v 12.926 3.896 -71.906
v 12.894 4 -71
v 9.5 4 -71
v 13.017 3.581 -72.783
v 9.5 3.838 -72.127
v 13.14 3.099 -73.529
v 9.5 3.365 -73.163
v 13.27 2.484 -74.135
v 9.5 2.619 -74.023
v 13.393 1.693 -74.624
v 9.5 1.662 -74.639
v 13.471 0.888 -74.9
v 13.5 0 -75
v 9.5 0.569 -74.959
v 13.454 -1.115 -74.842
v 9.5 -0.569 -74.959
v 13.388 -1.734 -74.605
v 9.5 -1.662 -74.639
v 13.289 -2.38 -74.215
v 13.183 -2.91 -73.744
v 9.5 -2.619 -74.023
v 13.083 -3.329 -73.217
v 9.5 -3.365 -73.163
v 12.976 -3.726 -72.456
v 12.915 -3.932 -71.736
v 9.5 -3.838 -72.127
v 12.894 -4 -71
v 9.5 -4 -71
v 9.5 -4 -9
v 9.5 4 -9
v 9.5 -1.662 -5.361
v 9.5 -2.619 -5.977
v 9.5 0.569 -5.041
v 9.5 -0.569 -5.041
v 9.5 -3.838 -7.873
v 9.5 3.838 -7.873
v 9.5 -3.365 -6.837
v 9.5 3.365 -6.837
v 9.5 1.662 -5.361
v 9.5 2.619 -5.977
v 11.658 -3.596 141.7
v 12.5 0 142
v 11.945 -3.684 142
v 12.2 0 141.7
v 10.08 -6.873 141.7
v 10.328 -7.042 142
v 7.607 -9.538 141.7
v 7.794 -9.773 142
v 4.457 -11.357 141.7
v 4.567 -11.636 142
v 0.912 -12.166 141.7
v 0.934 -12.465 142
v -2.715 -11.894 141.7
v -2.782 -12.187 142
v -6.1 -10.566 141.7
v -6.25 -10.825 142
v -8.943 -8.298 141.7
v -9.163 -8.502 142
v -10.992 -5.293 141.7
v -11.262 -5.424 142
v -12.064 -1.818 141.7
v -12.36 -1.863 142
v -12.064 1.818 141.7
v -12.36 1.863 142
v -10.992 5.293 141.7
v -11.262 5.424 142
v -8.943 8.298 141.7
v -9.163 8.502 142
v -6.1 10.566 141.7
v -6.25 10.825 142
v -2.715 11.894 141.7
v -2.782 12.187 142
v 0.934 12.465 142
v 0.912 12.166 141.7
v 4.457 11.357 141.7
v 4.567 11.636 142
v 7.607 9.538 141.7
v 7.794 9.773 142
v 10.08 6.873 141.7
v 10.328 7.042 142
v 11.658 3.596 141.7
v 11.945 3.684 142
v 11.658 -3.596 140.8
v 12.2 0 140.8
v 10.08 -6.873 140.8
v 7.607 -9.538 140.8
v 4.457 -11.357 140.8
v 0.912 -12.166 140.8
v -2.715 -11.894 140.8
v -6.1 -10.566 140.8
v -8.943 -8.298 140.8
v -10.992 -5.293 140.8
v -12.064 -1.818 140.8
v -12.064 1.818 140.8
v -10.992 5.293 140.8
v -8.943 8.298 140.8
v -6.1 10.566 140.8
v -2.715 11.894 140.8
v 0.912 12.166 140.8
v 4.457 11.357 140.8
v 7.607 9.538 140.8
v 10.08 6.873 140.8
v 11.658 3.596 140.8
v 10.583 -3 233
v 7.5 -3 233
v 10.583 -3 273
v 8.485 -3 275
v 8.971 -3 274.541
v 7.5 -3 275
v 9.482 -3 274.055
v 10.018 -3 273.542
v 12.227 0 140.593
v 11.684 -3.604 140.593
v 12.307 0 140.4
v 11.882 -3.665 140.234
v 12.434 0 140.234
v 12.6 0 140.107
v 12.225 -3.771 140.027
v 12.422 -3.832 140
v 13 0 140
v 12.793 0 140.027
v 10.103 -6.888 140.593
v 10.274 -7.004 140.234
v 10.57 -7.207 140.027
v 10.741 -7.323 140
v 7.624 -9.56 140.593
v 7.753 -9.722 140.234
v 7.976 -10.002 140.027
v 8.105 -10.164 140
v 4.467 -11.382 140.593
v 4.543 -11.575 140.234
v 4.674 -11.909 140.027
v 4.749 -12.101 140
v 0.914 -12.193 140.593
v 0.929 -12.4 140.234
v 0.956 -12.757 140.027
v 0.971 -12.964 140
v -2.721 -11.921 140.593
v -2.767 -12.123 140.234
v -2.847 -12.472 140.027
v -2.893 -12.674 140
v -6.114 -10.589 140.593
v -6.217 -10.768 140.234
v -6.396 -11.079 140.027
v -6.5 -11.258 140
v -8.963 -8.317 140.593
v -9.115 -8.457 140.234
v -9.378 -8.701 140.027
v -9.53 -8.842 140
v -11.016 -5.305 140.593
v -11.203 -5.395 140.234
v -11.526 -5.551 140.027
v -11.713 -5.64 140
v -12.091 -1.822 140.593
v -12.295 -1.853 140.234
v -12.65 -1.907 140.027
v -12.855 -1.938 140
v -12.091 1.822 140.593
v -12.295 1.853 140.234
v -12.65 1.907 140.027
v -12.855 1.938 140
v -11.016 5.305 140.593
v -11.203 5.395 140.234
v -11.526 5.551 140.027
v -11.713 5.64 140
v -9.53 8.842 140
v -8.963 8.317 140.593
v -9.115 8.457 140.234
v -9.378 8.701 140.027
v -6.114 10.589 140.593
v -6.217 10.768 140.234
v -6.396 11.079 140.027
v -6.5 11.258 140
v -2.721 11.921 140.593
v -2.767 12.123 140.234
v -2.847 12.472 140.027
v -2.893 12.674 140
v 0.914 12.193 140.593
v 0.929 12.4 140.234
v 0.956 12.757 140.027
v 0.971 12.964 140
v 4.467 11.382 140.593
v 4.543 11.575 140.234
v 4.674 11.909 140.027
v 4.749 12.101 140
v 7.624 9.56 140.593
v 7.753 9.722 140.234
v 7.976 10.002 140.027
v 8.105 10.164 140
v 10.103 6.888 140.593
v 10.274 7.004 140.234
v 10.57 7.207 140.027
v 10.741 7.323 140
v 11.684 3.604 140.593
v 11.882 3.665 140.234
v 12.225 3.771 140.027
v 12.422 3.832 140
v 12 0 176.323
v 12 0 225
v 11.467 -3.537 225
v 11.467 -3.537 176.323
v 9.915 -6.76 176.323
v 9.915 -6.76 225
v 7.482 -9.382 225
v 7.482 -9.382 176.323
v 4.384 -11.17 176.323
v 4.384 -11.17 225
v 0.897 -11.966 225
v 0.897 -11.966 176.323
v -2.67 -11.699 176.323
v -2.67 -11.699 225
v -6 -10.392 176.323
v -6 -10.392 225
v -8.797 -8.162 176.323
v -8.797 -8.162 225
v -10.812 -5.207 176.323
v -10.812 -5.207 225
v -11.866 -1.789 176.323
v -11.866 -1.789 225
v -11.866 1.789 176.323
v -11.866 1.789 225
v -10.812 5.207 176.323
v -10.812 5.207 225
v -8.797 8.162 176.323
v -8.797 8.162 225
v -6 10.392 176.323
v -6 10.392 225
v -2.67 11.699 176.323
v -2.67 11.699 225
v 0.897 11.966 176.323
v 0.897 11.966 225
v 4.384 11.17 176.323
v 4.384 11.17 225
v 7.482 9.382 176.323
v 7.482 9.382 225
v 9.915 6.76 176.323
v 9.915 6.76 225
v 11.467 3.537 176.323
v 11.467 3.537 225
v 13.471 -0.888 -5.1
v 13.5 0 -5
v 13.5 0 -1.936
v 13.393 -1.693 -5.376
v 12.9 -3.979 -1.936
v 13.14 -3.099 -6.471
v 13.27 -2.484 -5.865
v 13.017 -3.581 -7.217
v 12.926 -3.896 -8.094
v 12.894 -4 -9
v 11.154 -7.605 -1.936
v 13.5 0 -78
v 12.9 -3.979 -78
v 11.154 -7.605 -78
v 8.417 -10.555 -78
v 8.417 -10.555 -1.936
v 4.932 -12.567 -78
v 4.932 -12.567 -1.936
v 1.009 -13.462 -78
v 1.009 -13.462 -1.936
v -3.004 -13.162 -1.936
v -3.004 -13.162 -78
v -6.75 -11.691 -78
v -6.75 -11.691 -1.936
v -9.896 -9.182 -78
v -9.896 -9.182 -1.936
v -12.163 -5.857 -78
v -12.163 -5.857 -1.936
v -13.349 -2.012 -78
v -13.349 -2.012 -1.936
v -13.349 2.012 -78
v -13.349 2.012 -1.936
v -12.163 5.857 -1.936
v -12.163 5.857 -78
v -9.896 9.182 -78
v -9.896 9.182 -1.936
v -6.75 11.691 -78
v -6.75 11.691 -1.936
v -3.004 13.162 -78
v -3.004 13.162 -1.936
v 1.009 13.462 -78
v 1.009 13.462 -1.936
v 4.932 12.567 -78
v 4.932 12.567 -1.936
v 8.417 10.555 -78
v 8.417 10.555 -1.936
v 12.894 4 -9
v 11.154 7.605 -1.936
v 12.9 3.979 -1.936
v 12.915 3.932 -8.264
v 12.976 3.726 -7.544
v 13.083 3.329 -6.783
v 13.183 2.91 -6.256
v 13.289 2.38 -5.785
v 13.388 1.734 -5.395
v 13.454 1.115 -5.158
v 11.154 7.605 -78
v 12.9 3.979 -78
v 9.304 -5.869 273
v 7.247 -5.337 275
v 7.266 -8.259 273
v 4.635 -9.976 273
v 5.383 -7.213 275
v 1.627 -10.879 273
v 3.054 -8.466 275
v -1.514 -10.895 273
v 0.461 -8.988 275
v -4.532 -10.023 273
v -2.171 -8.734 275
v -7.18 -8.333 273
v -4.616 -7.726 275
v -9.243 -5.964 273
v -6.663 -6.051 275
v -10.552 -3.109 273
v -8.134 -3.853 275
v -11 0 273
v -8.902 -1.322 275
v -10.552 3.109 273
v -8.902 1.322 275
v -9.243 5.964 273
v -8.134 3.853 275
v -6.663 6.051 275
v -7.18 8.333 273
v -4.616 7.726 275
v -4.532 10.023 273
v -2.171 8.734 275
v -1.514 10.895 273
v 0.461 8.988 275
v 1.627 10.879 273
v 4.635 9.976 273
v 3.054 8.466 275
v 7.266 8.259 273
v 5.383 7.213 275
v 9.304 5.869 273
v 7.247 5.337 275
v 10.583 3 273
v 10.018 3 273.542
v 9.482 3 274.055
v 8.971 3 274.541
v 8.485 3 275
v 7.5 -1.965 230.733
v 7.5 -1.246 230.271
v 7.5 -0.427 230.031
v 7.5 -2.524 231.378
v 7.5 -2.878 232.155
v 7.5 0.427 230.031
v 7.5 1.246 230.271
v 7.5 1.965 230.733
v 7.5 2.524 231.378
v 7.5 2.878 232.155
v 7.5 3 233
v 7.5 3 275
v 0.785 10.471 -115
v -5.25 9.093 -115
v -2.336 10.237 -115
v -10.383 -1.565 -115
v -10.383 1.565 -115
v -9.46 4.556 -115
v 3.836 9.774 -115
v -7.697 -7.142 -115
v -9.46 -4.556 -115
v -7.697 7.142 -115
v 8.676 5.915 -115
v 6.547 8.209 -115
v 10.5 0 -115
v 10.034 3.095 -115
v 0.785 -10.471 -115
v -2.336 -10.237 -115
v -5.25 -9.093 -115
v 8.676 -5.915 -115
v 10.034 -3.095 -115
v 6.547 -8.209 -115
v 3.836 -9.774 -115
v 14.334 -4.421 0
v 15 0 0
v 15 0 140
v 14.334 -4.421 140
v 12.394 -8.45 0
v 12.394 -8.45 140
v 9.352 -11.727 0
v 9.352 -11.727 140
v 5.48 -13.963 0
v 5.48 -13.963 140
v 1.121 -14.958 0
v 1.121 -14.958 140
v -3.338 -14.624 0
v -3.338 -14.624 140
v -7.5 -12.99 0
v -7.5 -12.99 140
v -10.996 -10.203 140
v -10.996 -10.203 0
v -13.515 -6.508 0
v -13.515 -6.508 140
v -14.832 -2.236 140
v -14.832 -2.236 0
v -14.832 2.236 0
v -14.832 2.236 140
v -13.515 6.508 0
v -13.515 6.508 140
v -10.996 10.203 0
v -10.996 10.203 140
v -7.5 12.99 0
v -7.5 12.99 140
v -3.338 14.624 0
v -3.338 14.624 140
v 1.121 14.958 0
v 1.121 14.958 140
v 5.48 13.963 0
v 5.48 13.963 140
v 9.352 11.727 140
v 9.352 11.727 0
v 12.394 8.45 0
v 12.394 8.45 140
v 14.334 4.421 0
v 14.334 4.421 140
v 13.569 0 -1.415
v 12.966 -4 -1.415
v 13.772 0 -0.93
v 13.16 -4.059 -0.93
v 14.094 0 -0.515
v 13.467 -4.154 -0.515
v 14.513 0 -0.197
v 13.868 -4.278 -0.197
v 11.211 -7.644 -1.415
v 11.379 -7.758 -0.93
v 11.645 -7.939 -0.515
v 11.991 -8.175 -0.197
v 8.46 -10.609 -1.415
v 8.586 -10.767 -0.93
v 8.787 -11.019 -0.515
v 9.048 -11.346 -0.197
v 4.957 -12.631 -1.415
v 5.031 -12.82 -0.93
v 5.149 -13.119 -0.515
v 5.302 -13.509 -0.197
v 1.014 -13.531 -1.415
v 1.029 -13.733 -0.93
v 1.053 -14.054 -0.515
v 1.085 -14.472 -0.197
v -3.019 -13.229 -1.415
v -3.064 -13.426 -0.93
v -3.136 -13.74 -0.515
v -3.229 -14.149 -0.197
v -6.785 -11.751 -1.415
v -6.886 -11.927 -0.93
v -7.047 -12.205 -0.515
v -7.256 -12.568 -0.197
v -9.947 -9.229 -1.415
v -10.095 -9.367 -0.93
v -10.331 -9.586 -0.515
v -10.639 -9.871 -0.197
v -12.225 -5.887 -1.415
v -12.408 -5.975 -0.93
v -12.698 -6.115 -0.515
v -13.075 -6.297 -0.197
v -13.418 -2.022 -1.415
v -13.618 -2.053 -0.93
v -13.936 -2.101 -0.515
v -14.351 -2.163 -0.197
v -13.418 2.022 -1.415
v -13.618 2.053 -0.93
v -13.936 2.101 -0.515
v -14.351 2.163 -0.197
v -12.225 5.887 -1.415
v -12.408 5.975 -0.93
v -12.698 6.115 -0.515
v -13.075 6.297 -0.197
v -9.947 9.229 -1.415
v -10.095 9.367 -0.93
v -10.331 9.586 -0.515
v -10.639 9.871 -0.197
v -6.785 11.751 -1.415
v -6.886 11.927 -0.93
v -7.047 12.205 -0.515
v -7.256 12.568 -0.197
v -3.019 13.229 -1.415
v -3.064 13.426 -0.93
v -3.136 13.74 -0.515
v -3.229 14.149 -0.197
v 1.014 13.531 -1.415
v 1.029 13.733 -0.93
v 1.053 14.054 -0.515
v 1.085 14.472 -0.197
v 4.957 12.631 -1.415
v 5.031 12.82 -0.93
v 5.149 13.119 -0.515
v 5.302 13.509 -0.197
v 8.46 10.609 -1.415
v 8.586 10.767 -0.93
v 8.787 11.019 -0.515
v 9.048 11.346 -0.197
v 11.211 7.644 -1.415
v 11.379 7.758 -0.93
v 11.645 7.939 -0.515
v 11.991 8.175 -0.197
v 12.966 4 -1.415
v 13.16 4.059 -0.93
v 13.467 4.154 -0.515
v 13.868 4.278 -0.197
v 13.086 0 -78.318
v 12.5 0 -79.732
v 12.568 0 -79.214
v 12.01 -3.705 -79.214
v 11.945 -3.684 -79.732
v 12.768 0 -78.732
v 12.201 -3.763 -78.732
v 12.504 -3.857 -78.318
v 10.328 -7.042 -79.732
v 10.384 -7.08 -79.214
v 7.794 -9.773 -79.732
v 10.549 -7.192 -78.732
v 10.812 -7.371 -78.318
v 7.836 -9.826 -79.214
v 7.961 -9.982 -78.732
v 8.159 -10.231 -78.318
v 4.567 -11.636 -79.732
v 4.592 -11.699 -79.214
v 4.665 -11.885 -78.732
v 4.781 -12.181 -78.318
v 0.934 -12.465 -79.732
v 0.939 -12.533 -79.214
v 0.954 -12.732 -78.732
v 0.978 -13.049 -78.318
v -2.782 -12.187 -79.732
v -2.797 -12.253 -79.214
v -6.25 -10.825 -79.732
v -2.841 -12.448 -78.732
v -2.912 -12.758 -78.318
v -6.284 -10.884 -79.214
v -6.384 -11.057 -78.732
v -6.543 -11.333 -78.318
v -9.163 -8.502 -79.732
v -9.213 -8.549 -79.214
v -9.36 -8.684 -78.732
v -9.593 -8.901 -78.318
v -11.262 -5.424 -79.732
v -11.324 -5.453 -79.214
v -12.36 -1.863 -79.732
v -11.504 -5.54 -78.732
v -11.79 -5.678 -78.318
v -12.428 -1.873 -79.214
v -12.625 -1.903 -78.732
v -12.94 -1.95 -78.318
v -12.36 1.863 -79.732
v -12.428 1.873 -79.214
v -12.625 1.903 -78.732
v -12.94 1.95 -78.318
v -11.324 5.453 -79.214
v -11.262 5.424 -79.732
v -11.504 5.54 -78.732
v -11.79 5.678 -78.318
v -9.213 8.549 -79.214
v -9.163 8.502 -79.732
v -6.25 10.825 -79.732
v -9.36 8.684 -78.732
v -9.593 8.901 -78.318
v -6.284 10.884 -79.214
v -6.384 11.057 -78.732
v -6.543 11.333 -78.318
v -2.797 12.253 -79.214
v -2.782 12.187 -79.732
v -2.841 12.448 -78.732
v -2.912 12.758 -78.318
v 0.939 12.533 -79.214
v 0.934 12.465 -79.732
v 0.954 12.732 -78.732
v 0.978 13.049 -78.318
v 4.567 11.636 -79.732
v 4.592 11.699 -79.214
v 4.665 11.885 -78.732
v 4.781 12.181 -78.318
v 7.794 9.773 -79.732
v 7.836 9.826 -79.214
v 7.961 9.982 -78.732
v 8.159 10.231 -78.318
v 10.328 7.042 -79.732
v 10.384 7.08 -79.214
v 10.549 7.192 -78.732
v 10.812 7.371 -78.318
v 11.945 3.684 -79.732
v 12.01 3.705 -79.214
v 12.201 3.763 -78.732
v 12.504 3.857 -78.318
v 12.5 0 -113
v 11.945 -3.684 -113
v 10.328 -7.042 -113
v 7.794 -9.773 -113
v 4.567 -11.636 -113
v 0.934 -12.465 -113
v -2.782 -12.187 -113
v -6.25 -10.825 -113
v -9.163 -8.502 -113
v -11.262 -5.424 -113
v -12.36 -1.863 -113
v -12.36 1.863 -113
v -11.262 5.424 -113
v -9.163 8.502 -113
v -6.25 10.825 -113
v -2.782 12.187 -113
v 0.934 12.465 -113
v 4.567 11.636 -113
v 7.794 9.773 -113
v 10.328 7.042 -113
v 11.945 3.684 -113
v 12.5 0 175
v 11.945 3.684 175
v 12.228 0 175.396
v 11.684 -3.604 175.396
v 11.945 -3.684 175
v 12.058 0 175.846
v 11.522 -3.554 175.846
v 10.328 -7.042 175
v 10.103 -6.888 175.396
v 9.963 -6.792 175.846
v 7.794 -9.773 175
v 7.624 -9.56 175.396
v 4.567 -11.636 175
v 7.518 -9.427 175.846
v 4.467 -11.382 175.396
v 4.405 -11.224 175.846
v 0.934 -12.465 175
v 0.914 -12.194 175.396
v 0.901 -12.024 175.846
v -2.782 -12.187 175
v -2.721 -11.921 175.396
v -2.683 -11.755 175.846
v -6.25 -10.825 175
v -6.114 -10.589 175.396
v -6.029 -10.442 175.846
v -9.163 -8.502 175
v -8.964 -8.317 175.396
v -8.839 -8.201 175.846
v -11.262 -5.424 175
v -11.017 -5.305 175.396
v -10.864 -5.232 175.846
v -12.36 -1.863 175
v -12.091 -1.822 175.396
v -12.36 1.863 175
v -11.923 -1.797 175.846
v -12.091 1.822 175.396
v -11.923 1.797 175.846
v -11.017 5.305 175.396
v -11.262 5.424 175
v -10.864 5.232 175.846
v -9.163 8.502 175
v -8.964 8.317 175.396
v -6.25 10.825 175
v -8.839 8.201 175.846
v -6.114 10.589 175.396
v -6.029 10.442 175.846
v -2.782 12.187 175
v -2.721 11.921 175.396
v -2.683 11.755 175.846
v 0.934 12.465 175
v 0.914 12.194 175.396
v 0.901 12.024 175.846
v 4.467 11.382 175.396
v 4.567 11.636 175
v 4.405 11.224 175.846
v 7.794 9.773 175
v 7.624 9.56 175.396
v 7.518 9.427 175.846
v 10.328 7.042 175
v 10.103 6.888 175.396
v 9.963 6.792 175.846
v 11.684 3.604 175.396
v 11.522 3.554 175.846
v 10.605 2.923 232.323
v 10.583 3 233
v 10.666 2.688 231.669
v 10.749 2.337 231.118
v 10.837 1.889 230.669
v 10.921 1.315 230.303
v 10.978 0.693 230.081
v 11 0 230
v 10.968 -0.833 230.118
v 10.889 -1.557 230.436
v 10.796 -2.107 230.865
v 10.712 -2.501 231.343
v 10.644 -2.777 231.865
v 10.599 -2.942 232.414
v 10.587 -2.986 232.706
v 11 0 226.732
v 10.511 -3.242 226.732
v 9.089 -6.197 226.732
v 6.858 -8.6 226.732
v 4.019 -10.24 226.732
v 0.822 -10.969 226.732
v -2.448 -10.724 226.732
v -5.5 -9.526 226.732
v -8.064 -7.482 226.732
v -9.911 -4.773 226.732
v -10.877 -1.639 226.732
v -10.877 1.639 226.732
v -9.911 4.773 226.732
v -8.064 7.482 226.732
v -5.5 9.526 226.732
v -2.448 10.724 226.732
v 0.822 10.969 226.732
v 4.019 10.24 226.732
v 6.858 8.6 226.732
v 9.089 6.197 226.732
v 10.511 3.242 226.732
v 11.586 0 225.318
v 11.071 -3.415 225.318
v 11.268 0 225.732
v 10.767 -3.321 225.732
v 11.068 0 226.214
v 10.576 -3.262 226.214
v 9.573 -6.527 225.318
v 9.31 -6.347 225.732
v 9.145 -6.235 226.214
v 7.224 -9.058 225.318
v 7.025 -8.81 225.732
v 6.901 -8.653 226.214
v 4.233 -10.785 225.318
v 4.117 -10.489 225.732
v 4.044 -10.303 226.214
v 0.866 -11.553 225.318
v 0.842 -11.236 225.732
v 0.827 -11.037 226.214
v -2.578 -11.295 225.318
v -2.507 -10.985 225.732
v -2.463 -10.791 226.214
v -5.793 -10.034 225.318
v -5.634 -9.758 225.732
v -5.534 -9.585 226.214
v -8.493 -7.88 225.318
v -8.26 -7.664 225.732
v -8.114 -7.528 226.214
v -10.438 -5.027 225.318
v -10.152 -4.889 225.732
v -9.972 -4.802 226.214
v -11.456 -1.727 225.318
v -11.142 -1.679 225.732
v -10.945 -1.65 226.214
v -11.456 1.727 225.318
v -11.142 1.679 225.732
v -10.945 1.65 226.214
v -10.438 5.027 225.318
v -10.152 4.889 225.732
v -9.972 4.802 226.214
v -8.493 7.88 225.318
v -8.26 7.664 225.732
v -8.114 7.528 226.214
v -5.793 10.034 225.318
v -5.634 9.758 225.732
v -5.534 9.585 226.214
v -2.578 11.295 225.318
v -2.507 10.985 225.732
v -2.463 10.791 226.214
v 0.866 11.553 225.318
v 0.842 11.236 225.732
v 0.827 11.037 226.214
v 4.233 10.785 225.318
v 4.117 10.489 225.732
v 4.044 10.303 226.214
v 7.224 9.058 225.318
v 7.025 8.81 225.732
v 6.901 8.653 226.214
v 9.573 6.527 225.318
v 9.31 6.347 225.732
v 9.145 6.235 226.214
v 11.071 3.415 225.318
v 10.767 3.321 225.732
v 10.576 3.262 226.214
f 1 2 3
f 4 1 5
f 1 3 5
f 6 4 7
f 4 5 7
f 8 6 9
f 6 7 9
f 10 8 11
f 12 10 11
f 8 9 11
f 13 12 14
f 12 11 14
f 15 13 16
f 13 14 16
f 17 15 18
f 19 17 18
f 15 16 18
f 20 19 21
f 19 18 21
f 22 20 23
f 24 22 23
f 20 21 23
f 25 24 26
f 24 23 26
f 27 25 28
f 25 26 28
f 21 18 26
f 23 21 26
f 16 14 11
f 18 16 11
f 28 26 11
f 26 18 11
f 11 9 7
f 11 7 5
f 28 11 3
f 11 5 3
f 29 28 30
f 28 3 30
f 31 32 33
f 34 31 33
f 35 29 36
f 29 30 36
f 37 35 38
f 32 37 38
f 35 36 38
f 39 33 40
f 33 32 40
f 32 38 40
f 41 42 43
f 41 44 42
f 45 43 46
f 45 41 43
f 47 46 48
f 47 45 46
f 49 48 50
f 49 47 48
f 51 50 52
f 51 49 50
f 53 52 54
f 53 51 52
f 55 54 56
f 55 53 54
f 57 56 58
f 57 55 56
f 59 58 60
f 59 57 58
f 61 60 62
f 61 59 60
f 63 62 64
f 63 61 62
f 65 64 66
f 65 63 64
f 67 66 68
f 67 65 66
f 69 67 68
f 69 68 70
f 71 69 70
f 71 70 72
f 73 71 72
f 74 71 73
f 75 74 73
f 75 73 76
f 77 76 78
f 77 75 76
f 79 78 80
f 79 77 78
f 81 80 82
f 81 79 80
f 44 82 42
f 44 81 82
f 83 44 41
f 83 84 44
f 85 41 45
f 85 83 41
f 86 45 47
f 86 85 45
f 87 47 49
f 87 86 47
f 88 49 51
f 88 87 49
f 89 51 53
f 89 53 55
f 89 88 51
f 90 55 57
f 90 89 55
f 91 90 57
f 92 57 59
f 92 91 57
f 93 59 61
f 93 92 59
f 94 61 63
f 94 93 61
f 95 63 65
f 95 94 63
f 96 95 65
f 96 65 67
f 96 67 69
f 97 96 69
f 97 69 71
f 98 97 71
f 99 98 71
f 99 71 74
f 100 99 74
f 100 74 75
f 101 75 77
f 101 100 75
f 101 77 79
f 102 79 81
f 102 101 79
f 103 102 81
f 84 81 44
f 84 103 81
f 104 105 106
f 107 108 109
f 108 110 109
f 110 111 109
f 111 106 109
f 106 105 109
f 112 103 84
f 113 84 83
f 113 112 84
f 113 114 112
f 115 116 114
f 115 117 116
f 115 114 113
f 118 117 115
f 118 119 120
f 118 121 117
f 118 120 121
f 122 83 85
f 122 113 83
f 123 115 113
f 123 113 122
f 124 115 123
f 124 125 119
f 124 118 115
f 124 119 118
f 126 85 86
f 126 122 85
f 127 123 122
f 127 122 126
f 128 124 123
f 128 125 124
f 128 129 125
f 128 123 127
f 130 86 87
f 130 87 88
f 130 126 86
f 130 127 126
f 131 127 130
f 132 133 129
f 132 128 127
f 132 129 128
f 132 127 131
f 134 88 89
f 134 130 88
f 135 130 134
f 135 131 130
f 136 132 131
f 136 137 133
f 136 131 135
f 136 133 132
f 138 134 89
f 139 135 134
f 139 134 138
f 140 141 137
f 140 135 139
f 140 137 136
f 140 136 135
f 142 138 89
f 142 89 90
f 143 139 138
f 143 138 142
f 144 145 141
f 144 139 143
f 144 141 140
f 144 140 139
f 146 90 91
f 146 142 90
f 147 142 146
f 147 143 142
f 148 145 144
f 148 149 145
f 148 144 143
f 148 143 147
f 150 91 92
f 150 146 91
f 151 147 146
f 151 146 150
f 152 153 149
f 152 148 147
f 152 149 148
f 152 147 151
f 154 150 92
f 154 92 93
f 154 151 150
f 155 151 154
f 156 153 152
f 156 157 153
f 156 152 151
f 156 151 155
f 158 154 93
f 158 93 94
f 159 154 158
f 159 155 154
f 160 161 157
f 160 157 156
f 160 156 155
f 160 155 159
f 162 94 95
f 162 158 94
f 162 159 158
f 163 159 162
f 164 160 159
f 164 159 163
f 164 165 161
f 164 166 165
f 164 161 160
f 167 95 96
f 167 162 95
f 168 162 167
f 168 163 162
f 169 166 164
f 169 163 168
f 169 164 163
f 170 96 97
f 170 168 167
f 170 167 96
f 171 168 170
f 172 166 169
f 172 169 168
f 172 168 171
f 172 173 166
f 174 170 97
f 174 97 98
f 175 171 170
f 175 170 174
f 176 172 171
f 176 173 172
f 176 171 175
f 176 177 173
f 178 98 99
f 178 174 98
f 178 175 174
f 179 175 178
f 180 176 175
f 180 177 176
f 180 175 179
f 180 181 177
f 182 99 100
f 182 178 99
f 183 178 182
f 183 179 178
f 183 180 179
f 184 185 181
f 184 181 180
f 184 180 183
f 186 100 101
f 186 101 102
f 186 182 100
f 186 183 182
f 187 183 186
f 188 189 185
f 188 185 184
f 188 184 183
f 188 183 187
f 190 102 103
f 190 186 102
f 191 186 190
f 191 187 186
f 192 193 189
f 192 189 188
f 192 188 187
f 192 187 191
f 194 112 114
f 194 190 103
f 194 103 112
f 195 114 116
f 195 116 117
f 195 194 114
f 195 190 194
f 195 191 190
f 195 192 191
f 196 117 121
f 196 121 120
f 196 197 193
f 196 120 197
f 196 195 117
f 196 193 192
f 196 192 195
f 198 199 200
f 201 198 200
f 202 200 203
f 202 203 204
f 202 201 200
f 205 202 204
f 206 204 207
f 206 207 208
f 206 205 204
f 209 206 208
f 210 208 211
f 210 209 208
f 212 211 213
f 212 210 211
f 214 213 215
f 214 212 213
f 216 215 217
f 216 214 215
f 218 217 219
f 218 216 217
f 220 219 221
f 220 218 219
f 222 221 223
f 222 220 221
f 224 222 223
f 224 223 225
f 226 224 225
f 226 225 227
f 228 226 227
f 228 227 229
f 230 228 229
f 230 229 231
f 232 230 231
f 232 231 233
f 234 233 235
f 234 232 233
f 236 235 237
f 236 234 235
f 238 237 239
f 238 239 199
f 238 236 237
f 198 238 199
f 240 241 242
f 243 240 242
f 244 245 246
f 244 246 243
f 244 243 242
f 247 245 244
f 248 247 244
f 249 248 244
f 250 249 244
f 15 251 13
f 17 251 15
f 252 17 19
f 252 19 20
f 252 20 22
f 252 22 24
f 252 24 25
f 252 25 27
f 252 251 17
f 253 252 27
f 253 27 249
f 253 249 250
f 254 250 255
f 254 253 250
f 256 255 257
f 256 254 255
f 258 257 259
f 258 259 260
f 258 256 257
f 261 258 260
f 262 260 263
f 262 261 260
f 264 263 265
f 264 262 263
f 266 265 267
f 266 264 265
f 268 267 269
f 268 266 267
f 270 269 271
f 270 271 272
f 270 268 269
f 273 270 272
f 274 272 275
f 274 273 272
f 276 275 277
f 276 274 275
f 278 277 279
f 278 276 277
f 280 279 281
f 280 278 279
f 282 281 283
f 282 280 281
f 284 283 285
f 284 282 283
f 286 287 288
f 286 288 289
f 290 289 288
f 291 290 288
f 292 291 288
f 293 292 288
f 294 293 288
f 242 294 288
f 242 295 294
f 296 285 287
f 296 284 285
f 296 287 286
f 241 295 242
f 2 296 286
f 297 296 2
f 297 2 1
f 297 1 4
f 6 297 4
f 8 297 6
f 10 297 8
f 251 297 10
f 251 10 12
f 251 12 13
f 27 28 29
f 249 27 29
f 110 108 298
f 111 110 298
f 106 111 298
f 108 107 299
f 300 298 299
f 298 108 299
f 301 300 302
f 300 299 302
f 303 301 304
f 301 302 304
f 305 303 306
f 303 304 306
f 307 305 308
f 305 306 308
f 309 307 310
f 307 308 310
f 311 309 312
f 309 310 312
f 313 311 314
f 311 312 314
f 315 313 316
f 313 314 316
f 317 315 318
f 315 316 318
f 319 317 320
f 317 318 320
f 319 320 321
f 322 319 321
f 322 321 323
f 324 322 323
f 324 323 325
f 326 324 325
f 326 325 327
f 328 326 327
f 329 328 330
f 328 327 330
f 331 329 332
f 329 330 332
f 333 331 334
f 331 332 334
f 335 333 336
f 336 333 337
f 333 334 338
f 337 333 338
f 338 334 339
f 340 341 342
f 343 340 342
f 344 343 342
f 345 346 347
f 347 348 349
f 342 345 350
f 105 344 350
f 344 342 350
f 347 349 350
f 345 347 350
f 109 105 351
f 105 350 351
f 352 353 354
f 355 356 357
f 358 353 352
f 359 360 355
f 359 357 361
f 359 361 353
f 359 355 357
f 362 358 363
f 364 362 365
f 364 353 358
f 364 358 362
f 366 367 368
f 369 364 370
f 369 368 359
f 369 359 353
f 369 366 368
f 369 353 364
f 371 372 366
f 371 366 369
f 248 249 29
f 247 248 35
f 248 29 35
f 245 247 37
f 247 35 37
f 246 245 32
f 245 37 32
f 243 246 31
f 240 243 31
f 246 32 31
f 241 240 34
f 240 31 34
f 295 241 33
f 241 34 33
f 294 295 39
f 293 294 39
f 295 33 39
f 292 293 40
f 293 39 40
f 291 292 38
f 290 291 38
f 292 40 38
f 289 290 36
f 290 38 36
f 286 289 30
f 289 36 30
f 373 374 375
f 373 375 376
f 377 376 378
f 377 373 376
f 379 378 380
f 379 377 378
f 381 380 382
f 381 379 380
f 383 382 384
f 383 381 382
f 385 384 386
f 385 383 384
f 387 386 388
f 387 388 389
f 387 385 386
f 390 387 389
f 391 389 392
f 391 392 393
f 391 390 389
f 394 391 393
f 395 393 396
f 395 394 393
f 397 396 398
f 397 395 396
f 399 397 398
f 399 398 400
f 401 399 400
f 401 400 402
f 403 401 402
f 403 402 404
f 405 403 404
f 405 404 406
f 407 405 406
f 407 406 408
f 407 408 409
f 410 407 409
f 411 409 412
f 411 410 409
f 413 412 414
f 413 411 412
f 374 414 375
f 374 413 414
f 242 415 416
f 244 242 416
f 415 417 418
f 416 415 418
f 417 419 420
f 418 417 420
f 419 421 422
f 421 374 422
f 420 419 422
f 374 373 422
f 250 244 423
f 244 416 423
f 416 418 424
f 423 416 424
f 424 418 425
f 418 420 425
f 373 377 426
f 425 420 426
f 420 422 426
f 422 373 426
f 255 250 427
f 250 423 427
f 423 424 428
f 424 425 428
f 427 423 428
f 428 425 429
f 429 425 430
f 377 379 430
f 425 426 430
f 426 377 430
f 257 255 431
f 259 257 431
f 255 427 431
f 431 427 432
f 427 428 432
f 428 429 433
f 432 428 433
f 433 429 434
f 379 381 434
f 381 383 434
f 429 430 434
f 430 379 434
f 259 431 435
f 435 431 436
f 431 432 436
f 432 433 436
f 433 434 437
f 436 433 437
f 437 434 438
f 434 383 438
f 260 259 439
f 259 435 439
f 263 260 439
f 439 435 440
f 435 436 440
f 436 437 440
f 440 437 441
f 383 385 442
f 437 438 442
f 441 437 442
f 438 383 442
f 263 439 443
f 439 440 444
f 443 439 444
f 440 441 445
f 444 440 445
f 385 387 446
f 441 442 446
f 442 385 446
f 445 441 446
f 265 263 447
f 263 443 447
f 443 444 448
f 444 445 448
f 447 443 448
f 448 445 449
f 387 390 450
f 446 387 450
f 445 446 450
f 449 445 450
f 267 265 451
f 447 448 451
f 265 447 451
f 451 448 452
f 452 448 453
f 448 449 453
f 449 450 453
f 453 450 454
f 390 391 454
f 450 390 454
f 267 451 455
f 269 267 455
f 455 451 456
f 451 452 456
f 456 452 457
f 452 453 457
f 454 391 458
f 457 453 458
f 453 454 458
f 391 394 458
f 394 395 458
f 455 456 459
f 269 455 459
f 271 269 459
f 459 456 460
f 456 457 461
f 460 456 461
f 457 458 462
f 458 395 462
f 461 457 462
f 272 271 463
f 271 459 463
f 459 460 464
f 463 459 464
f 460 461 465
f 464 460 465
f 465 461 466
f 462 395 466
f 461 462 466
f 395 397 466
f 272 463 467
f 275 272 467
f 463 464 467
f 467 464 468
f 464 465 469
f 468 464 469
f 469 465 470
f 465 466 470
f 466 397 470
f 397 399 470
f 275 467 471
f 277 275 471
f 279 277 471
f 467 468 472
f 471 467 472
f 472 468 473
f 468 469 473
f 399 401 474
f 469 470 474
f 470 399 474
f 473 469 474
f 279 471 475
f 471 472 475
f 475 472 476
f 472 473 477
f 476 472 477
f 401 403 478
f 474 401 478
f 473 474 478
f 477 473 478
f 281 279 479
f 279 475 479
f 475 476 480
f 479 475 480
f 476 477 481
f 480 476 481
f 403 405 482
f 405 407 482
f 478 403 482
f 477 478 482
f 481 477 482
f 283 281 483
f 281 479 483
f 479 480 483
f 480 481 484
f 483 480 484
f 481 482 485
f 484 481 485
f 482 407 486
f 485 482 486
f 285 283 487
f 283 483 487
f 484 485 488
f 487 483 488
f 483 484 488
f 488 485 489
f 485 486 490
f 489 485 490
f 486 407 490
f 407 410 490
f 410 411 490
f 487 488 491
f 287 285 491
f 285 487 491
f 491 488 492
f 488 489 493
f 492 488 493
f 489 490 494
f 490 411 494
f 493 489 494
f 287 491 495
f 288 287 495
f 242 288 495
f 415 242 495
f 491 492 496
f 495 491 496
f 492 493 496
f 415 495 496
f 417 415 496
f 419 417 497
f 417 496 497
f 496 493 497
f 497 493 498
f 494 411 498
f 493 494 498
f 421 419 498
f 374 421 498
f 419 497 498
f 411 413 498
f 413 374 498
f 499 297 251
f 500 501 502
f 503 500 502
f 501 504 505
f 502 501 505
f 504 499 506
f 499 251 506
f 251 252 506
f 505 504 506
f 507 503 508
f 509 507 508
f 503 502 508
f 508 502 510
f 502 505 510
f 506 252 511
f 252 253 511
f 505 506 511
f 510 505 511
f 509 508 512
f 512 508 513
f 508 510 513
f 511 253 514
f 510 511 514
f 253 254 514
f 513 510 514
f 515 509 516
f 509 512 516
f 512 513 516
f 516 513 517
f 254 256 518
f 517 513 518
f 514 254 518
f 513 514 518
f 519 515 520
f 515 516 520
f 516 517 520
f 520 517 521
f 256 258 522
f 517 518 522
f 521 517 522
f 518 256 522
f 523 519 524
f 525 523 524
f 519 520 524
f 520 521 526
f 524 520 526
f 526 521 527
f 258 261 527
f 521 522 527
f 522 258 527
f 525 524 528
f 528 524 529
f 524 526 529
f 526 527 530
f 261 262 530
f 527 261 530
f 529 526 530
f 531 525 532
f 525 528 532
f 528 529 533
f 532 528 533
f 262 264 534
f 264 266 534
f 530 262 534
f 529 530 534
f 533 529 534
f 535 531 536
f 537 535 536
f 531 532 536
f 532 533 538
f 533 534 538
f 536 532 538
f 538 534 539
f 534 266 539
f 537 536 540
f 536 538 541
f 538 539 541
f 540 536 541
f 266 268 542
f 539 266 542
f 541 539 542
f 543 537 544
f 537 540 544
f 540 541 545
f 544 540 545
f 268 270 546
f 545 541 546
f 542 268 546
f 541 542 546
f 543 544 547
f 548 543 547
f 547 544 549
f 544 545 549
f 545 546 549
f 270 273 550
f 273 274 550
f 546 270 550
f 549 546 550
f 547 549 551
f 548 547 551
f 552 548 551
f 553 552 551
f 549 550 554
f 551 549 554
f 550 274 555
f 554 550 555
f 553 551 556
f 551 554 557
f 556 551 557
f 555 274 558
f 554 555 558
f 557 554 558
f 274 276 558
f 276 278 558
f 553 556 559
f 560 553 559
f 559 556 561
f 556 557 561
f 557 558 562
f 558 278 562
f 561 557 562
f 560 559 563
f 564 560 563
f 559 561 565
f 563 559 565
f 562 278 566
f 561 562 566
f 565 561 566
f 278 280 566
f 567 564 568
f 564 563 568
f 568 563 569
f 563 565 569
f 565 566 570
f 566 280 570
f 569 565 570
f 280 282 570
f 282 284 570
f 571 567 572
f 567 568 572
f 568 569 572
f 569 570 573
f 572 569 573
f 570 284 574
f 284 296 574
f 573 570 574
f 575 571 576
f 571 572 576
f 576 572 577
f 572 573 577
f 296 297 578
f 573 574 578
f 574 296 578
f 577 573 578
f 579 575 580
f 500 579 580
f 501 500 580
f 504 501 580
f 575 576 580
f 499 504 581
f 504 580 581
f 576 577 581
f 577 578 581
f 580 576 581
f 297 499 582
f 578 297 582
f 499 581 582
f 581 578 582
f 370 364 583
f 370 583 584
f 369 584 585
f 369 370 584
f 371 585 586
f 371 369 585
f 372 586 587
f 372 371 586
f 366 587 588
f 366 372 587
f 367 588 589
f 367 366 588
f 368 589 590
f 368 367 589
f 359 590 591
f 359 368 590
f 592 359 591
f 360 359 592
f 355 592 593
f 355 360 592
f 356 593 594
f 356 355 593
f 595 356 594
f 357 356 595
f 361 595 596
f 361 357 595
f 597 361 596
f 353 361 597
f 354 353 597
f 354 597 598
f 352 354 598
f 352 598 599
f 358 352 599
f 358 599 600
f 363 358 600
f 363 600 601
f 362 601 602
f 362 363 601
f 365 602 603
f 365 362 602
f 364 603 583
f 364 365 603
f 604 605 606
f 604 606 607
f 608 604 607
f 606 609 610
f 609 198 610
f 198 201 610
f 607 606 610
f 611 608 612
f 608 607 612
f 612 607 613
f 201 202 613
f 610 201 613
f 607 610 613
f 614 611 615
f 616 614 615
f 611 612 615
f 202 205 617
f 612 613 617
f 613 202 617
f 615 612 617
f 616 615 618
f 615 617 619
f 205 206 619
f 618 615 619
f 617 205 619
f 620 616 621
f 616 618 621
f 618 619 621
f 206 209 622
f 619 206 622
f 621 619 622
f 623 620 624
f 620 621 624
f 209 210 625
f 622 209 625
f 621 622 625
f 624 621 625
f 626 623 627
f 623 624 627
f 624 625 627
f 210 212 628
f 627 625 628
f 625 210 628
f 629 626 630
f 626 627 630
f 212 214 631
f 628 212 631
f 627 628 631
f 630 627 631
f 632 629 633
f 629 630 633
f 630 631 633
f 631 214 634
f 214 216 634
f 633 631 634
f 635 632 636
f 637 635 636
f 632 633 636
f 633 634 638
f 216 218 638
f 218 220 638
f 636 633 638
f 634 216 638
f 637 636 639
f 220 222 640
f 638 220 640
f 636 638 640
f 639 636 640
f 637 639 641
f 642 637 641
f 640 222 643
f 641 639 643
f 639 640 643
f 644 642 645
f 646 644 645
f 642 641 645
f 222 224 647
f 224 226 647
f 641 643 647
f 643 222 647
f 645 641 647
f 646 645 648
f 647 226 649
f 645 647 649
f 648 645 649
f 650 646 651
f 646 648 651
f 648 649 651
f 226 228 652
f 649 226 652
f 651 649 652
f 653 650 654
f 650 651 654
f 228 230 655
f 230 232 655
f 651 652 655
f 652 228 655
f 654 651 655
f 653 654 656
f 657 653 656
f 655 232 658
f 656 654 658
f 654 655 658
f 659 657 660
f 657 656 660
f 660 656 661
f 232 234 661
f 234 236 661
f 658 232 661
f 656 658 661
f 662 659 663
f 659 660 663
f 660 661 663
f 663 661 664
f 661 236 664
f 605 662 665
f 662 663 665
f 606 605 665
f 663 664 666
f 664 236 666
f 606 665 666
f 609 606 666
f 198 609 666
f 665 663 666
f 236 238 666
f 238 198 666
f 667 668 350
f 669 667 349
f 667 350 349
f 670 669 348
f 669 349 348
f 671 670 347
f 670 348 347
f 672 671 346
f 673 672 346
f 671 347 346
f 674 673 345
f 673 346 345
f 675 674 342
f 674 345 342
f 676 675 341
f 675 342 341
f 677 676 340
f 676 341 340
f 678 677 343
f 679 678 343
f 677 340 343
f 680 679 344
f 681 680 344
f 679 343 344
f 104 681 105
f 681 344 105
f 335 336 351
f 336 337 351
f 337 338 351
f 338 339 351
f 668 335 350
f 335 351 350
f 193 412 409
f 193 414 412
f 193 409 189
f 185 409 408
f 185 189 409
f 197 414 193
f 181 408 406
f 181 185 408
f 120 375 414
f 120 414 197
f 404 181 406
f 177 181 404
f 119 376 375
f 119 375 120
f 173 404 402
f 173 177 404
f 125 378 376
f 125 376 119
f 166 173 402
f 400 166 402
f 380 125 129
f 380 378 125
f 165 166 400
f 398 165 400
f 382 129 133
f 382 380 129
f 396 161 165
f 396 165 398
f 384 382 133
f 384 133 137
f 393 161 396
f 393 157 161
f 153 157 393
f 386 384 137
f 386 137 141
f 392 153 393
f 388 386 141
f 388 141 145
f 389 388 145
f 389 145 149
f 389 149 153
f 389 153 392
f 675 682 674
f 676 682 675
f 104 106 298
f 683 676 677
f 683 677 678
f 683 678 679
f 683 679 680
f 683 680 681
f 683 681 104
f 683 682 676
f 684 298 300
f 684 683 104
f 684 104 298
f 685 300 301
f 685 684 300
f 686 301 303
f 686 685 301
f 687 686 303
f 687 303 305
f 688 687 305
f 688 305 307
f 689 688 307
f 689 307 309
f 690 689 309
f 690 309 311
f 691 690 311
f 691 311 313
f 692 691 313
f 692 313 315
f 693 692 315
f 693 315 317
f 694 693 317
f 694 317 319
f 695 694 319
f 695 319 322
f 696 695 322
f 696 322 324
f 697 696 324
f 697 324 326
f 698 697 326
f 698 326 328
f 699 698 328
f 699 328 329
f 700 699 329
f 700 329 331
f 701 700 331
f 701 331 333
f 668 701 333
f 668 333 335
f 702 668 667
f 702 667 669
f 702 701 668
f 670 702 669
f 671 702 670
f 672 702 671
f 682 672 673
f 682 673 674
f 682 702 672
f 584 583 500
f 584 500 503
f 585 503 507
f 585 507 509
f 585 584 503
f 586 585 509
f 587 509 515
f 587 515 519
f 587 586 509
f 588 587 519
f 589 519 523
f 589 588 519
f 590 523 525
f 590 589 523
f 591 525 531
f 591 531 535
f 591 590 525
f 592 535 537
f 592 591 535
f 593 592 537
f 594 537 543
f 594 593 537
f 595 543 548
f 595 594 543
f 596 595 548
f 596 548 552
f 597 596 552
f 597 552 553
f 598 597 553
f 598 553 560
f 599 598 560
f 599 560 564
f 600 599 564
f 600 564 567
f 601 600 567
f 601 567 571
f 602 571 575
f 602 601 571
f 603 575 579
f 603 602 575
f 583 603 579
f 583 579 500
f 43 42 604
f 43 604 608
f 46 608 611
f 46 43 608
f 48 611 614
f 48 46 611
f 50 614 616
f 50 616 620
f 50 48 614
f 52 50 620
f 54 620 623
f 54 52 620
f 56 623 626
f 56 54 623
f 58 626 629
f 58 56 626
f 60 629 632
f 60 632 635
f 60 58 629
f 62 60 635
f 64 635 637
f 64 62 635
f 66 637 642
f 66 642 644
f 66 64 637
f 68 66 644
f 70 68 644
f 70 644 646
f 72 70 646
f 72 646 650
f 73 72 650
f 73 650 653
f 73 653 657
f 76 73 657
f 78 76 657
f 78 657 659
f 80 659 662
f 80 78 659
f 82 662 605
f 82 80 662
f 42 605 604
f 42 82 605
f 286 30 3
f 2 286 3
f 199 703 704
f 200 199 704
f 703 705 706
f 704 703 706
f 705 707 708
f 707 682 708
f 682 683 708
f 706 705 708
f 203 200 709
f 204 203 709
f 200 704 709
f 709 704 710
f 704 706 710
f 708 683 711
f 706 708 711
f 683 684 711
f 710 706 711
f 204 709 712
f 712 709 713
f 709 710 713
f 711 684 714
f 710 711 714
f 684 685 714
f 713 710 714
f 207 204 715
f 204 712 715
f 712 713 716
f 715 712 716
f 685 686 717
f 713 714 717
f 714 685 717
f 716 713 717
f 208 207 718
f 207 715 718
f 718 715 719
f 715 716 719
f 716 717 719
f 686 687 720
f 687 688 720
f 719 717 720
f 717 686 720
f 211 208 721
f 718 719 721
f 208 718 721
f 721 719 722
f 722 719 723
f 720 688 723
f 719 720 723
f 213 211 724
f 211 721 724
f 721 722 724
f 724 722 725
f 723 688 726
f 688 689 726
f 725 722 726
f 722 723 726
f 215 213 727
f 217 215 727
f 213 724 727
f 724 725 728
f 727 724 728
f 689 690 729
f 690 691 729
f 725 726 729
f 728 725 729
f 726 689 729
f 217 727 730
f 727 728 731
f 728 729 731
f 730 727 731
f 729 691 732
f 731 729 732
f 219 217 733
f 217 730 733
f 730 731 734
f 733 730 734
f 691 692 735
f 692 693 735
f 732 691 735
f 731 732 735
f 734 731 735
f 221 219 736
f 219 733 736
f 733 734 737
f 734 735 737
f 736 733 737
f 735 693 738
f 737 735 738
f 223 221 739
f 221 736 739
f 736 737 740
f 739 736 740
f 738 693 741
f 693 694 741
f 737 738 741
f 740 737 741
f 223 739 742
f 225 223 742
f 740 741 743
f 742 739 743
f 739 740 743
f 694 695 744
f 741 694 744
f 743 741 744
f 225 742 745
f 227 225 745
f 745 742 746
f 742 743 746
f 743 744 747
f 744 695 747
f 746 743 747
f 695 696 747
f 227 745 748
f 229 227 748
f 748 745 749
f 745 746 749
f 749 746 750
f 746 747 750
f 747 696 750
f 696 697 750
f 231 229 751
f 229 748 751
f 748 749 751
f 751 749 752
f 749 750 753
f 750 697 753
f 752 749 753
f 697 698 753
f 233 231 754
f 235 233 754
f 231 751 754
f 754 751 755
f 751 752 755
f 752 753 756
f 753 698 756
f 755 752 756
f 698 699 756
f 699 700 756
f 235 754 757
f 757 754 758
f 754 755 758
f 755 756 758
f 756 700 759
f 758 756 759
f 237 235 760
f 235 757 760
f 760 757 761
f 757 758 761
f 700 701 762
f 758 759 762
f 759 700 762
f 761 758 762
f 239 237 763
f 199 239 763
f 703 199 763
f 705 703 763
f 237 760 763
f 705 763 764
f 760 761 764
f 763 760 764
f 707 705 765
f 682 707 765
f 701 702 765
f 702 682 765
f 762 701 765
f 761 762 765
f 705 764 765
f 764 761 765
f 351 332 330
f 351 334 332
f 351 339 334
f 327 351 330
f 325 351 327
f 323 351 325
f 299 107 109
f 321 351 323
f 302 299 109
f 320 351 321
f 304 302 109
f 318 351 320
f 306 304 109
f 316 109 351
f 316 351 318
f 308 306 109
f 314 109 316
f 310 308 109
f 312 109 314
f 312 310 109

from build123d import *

# Parameters (mm, degrees)
FILLET_1_R          = 2
CHAMFER_1_SIZE      = 2
CUT_EXTRUDE_1_DEPTH = 17
CUT_EXTRUDE_2_DEPTH = 51


with BuildPart() as part:
    # 草图1 → 旋转1 (revolve)
    with BuildSketch(Plane(origin=(0, 0, 0), x_dir=(0, 0, -1), z_dir=(1, 0, 0)), mode=Mode.PRIVATE) as revolve_1_sk:
        with BuildLine():
            Line((-275, 0), (-275, 11))
            Line((-275, 11), (-225, 11))
            Line((-225, 11), (-225, 12))
            Line((-225, 12), (-175, 12))
            Line((-175, 12), (-175, 12.5))
            Line((-175, 12.5), (-142, 12.5))
            Line((-142, 12.5), (-141.7, 12.2))
            Line((-141.7, 12.2), (-140.8, 12.2))
            ThreePointArc((-140.8, 12.2), (-140.234314575, 12.434314575), (-140, 13))
            Line((-140, 13), (-140, 15))
            Line((-140, 15), (0, 15))
            Line((0, 15), (0, 13.5))
            Line((0, 13.5), (78, 13.5))
            Line((78, 13.5), (78, 12.5))
            Line((78, 12.5), (115, 12.5))
            Line((115, 12.5), (115, 0))
            Line((115, 0), (-275, 0))
        make_face()
    revolve(revolve_1_sk.sketch.rotate(Axis((0, 0, 55.025776128), (0, 0, -1)), 90), axis=Axis((0, 0, 55.025776128), (0, 0, -1)))

    # 圆角1
    # the kernel refuses this fillet: 2 mm, written as the material it adds along each edge
    with BuildSketch(Plane(origin=(0, 0, -78), x_dir=(1, 0, 0), z_dir=(0, 1, 0))) as fillet_1_piece_1:
        with BuildLine():
            CenterArc((14.5, 1.732050808), FILLET_1_R, 180, 60)
            Line((12.5, 1.732050808), (12.46, 1.732050808))
            Line((12.46, 1.732050808), (12.46, 0))
            Line((12.46, 0), (12.5, -0.04))
            ThreePointArc((12.5, -0.04), (13, -0.04), (13.48, -0.034641016))
            Line((13.48, -0.034641016), (13.5, 0))
        make_face()
    revolve(axis=Axis((0, 0, -78), (0, 0, -1)))
    with BuildSketch(Plane(origin=(0, 0, 0), x_dir=(1, 0, 0), z_dir=(0, 1, 0))) as fillet_1_piece_2:
        with BuildLine():
            CenterArc((15.5, 1.936491673), FILLET_1_R, 180, 75.522487814)
            Line((13.5, 1.936491673), (13.46, 1.936491673))
            Line((13.46, 1.936491673), (13.46, 0))
            Line((13.46, 0), (13.5, -0.04))
            ThreePointArc((13.5, -0.04), (14.25, -0.04), (14.99, -0.038729833))
            Line((14.99, -0.038729833), (15, 0))
        make_face()
    revolve(axis=Axis((0, 0, 0), (0, 0, -1)))
    with BuildSketch(Plane(origin=(0, 0, 175), x_dir=(1, 0, 0), z_dir=(0, 1, 0))) as fillet_1_piece_3:
        with BuildLine():
            CenterArc((14, -1.322875656), FILLET_1_R, 138.590377891, 41.409622109)
            Line((12.5, 0), (12.47, 0.026457513))
            ThreePointArc((12.47, 0.026457513), (12.25, 0.04), (12, 0.04))
            Line((12, 0.04), (11.96, 0))
            Line((11.96, 0), (11.96, -1.322875656))
            Line((11.96, -1.322875656), (12, -1.322875656))
        make_face()
    revolve(axis=Axis((0, 0, 175), (0, 0, -1)))
    with BuildSketch(Plane(origin=(0, 0, 225), x_dir=(1, 0, 0), z_dir=(0, 1, 0))) as fillet_1_piece_4:
        with BuildLine():
            CenterArc((13, -1.732050808), FILLET_1_R, 120, 60)
            Line((12, 0), (11.98, 0.034641016))
            ThreePointArc((11.98, 0.034641016), (11.5, 0.04), (11, 0.04))
            Line((11, 0.04), (10.96, 0))
            Line((10.96, 0), (10.96, -1.732050808))
            Line((10.96, -1.732050808), (11, -1.732050808))
        make_face()
    revolve(axis=Axis((0, 0, 225), (0, 0, -1)))

    # 倒角1
    chamfer_1_edges = [part.edges().sort_by_distance(p)[0] for p in [
        (-12.5, 0, -115),
        (-11, 0, 275),
    ]]
    chamfer(chamfer_1_edges, length=CHAMFER_1_SIZE)

    # 草图2 → 切除-拉伸1 (cut)
    with BuildSketch(Plane(origin=(7.5, 0, 0), x_dir=(0, 0, -1), z_dir=(1, 0, 0))):
        with BuildLine():
            Line((-275, 3), (-233, 3))
            ThreePointArc((-233, 3), (-230, 0), (-233, -3))
            Line((-233, -3), (-275, -3))
            Line((-275, -3), (-275, 3))
        make_face()
    extrude(amount=CUT_EXTRUDE_1_DEPTH, mode=Mode.SUBTRACT)

    # 草图3 → 切除-拉伸2 (cut)
    with BuildSketch(Plane(origin=(9.5, 0, 0), x_dir=(0, 0, -1), z_dir=(1, 0, 0))):
        with BuildLine():
            Line((9, 4), (71, 4))
            ThreePointArc((71, 4), (75, 0), (71, -4))
            Line((71, -4), (9, -4))
            ThreePointArc((9, -4), (5, 0), (9, 4))
        make_face()
    extrude(amount=CUT_EXTRUDE_2_DEPTH, mode=Mode.SUBTRACT)


solid = part.part
